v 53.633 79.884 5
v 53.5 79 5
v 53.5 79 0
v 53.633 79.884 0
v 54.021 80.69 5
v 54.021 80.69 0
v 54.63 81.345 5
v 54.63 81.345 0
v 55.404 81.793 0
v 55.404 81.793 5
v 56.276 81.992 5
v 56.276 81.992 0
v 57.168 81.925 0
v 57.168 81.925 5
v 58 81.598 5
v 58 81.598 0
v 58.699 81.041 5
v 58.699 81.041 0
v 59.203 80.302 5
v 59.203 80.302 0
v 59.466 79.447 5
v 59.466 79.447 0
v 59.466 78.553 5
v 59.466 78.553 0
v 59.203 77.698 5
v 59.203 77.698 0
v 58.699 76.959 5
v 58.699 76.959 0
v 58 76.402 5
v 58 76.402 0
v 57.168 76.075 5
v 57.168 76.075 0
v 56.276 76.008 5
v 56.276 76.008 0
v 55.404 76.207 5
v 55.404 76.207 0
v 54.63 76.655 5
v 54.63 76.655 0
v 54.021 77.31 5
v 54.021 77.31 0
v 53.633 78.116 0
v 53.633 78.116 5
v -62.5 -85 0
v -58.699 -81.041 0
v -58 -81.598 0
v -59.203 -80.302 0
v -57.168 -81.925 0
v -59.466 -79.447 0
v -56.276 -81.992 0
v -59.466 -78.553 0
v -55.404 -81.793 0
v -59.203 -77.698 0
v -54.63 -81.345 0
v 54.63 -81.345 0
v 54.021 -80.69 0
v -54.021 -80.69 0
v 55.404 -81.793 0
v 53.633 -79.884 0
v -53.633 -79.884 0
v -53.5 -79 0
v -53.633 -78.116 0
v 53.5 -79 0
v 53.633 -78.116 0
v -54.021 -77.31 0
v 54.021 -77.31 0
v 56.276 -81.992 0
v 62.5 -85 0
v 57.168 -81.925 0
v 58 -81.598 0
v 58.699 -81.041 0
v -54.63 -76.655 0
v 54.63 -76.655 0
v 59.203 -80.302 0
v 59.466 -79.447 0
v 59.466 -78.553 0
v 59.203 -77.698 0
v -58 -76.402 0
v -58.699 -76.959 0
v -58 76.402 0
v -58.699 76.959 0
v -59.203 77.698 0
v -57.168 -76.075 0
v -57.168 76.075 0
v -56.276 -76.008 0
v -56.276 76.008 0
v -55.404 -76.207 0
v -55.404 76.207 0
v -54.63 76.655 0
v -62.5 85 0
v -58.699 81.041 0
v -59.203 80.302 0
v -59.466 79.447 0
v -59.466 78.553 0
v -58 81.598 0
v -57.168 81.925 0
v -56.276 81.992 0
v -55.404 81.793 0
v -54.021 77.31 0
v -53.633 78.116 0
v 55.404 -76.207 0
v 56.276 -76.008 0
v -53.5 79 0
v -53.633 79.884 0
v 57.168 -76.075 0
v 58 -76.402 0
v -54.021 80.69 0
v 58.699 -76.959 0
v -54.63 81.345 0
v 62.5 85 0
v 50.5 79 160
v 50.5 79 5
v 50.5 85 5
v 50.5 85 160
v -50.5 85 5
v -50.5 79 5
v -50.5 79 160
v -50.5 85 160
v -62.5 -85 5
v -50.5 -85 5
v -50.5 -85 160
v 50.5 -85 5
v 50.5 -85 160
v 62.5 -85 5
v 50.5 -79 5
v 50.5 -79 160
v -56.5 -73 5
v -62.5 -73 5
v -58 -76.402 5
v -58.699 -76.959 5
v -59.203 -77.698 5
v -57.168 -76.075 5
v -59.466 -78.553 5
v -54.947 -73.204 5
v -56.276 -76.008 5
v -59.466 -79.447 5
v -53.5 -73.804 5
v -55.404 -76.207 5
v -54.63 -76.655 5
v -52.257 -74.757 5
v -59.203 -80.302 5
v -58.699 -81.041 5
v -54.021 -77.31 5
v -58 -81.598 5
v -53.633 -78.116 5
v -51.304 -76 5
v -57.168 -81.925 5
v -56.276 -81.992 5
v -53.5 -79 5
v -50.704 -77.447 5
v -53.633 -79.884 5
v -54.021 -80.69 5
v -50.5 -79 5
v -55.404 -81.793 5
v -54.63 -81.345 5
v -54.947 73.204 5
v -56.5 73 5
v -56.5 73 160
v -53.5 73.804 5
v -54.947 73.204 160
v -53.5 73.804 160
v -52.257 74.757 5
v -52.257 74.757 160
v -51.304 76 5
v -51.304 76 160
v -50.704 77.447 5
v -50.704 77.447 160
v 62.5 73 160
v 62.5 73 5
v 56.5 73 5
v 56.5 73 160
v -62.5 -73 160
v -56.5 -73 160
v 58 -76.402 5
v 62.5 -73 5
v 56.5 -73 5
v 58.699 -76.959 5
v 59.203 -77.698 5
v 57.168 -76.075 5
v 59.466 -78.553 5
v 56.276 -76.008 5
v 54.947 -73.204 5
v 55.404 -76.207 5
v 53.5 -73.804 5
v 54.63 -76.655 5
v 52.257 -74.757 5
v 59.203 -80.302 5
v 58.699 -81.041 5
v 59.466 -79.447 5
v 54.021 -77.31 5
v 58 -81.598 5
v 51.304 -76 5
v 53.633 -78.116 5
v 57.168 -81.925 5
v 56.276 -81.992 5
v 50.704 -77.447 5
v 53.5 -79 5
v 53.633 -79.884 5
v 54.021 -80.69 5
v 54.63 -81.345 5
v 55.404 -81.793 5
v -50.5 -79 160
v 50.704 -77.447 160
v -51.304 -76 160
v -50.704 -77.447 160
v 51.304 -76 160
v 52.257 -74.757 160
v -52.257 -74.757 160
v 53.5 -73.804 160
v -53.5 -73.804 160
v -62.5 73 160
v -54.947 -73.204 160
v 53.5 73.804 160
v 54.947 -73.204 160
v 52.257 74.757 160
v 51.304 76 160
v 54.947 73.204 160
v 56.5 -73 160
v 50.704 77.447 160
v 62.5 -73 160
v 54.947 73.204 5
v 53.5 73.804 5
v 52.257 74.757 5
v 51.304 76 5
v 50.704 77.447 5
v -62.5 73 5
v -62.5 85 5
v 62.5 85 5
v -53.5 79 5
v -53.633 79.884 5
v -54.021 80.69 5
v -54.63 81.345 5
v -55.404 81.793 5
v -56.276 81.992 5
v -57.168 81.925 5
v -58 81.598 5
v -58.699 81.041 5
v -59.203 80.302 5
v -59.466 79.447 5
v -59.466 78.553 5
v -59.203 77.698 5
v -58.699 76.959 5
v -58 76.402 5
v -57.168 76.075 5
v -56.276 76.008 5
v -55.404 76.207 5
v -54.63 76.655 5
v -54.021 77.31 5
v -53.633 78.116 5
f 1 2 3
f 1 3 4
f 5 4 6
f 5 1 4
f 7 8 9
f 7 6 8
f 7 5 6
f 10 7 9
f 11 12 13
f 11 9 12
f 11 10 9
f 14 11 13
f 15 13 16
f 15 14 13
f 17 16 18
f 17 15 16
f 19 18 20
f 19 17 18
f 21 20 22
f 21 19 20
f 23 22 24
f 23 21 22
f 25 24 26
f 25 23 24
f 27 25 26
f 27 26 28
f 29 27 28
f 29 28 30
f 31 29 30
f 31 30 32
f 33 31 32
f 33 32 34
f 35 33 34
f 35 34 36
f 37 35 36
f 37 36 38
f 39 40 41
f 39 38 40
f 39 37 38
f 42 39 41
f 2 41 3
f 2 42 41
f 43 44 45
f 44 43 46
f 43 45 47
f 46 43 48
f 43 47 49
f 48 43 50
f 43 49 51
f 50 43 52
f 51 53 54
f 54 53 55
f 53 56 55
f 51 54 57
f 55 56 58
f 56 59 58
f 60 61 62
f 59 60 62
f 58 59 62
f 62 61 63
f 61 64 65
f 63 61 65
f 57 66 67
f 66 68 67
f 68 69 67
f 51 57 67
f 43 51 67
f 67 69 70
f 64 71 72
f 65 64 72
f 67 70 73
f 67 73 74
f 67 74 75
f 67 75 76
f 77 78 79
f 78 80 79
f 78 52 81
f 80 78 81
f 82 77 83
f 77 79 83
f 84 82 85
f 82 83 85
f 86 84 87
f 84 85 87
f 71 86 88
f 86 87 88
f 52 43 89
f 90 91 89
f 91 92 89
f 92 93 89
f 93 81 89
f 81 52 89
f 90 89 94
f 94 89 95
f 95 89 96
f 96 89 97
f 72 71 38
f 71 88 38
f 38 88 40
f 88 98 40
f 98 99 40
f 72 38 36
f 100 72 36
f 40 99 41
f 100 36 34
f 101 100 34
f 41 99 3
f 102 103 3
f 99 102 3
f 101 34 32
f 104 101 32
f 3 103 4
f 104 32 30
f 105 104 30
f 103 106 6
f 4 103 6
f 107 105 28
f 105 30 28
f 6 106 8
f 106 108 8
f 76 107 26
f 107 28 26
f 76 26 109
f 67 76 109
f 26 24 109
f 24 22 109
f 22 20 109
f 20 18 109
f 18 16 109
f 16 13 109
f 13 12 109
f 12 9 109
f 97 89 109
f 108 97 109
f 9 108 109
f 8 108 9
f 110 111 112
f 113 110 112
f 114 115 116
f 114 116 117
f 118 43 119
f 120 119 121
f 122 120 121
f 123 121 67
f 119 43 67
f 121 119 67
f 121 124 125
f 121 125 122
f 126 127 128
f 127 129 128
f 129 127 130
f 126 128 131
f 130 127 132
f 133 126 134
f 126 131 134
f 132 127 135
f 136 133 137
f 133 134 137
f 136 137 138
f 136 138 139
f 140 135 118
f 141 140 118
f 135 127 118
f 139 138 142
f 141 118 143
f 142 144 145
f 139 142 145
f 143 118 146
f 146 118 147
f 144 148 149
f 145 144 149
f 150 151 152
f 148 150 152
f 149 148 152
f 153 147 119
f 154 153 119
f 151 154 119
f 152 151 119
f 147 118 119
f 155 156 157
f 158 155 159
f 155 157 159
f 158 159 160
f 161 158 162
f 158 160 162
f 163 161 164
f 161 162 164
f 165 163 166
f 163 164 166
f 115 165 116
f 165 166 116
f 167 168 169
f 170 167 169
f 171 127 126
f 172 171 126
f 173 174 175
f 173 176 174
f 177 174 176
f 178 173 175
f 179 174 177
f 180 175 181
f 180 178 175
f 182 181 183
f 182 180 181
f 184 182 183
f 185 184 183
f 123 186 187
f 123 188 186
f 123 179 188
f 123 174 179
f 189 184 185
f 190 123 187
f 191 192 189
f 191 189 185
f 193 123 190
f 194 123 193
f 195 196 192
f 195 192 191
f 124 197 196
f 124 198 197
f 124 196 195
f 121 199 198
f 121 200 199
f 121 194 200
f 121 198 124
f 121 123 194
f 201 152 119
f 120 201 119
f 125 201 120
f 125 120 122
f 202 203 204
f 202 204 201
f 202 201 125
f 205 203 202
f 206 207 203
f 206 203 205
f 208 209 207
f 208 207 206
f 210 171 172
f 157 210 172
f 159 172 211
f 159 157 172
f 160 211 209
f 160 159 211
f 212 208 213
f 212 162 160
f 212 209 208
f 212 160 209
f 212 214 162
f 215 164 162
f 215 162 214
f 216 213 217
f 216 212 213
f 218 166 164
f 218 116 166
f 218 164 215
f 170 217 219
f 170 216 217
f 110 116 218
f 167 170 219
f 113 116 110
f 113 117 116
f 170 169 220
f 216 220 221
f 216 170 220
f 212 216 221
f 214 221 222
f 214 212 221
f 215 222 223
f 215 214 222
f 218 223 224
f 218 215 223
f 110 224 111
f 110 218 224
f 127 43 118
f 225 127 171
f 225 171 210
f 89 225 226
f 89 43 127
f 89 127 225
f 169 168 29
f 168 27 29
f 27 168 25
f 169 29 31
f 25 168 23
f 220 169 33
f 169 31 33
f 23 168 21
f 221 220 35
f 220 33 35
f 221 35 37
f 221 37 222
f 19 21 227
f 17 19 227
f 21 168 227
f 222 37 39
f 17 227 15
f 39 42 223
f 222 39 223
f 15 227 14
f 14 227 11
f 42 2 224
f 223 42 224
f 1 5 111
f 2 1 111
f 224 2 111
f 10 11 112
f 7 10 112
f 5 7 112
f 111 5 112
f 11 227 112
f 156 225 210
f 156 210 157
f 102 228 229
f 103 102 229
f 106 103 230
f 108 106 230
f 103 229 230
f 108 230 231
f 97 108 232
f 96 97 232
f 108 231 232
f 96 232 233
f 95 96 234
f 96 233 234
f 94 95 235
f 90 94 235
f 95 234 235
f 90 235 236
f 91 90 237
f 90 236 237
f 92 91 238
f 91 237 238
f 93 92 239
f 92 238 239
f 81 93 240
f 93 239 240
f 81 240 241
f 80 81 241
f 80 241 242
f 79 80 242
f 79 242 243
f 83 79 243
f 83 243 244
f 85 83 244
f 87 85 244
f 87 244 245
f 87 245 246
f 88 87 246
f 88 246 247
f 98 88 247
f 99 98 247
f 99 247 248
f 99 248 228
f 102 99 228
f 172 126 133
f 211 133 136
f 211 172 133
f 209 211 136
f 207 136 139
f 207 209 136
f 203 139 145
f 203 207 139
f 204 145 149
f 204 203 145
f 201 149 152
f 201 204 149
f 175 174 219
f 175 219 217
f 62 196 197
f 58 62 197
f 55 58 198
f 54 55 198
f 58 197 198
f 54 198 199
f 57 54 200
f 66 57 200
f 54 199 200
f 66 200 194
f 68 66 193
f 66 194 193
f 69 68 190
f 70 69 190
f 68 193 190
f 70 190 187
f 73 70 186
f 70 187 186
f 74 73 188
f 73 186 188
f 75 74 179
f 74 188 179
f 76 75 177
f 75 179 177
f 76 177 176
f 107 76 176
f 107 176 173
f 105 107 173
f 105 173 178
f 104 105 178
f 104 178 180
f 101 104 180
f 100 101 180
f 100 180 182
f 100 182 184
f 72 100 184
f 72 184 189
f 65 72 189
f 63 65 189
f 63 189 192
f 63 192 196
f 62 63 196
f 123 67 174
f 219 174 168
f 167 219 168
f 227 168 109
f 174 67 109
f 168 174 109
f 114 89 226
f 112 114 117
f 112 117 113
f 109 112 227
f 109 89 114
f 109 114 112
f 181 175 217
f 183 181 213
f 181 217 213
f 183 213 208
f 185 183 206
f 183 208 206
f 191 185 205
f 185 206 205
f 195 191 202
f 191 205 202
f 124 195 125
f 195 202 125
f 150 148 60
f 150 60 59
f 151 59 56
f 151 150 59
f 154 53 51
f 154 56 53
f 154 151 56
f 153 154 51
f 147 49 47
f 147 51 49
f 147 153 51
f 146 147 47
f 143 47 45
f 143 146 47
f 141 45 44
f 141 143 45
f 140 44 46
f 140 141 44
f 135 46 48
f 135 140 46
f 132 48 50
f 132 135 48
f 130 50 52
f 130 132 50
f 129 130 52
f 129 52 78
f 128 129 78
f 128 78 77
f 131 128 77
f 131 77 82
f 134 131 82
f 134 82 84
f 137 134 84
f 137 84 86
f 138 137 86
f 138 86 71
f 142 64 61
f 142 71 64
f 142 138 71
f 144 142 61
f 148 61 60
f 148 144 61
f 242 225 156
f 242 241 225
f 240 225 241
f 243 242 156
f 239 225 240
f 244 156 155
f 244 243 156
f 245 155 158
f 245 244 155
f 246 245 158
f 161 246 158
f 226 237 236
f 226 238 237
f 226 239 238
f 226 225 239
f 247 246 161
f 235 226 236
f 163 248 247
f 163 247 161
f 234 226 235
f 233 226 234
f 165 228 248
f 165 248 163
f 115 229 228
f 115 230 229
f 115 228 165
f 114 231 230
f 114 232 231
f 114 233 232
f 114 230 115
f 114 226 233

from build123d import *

# Parameters (mm, degrees)
SKETCH1_W               = 125
SKETCH1_H               = 170
BOSS_EXTRUDE1_DEPTH     = 160
SKETCH2_R               = 3
CUT_EXTRUDE1_DEPTH      = 155
SKETCH2_3_R             = 3
CUT_EXTRUDE2_DEPTH      = 192.653985088
MIRROR2_COPY_1_SKETCH_R = 3
MIRROR2_COPY_1_DEPTH    = 155
MIRROR2_COPY_2_SKETCH_R = 3
MIRROR2_COPY_2_DEPTH    = 192.653985088


with BuildPart() as part:
    # Sketch1 → Boss-Extrude1 (new body)
    with BuildSketch(Plane.XY):
        Rectangle(SKETCH1_W, SKETCH1_H)
    extrude(amount=BOSS_EXTRUDE1_DEPTH)

    # Sketch2 → Cut-Extrude1 (cut)
    # profile 1 of 2: a face of its own
    with BuildSketch(Plane.XY.offset(160)):
        with BuildLine():
            Line((-50.5, 85), (-62.5, 85))
            Line((-62.5, 85), (-62.5, 73))
            Line((-62.5, 73), (-56.5, 73))
            ThreePointArc((-56.5, 73), (-52.257359313, 74.757359313), (-50.5, 79))
            Line((-50.5, 79), (-50.5, 85))
        make_face()
        with Locations((-56.5, 79)):
            Circle(SKETCH2_R, mode=Mode.SUBTRACT)
    # profile 2 of 2: a face of its own
    with BuildSketch(Plane.XY.offset(160)):
        with Locations((-56.5, 79)):
            Circle(SKETCH2_R)
    cut_extrude1 = extrude(amount=-CUT_EXTRUDE1_DEPTH, mode=Mode.SUBTRACT)

    # Sketch2<3> → Cut-Extrude2 (cut, through all)
    with BuildSketch(Plane.XY.offset(160)):
        with Locations((-56.5, 79)):
            Circle(SKETCH2_3_R)
    cut_extrude2 = extrude(amount=-CUT_EXTRUDE2_DEPTH, mode=Mode.SUBTRACT)

    # Mirror1: Cut-Extrude1, Cut-Extrude2 across plane
    add(cut_extrude1.mirror(Plane.ZX), mode=Mode.SUBTRACT)
    add(cut_extrude2.mirror(Plane.ZX), mode=Mode.SUBTRACT)

    # Mirror2: Cut-Extrude1, Cut-Extrude2 across plane
    add(cut_extrude1.mirror(Plane(origin=(0, 0, 0), x_dir=(0, 0, 1), z_dir=(1, 0, 0))), mode=Mode.SUBTRACT)
    add(cut_extrude2.mirror(Plane(origin=(0, 0, 0), x_dir=(0, 0, 1), z_dir=(1, 0, 0))), mode=Mode.SUBTRACT)

    # Mirror2 copy 1 sketch → Mirror2 copy 1 (cut)
    # profile 1 of 2: a face of its own
    with BuildSketch(Plane(origin=(0, 0, 160), x_dir=(-1, 0, 0), z_dir=(0, 0, 1))):
        with BuildLine():
            Line((-50.5, 85), (-62.5, 85))
            Line((-62.5, 85), (-62.5, 73))
            Line((-62.5, 73), (-56.5, 73))
            ThreePointArc((-56.5, 73), (-52.257359313, 74.757359313), (-50.5, 79))
            Line((-50.5, 79), (-50.5, 85))
        make_face()
        with Locations((-56.5, 79)):
            Circle(MIRROR2_COPY_1_SKETCH_R, mode=Mode.SUBTRACT)
    # profile 2 of 2: a face of its own
    with BuildSketch(Plane(origin=(0, 0, 160), x_dir=(-1, 0, 0), z_dir=(0, 0, 1))):
        with Locations((-56.5, 79)):
            Circle(MIRROR2_COPY_1_SKETCH_R)
    extrude(amount=-MIRROR2_COPY_1_DEPTH, mode=Mode.SUBTRACT)

    # Mirror2 copy 2 sketch → Mirror2 copy 2 (cut, through all)
    with BuildSketch(Plane(origin=(0, 0, 160), x_dir=(-1, 0, 0), z_dir=(0, 0, 1))):
        with Locations((-56.5, 79)):
            Circle(MIRROR2_COPY_2_SKETCH_R)
    extrude(amount=-MIRROR2_COPY_2_DEPTH, mode=Mode.SUBTRACT)


solid = part.part
